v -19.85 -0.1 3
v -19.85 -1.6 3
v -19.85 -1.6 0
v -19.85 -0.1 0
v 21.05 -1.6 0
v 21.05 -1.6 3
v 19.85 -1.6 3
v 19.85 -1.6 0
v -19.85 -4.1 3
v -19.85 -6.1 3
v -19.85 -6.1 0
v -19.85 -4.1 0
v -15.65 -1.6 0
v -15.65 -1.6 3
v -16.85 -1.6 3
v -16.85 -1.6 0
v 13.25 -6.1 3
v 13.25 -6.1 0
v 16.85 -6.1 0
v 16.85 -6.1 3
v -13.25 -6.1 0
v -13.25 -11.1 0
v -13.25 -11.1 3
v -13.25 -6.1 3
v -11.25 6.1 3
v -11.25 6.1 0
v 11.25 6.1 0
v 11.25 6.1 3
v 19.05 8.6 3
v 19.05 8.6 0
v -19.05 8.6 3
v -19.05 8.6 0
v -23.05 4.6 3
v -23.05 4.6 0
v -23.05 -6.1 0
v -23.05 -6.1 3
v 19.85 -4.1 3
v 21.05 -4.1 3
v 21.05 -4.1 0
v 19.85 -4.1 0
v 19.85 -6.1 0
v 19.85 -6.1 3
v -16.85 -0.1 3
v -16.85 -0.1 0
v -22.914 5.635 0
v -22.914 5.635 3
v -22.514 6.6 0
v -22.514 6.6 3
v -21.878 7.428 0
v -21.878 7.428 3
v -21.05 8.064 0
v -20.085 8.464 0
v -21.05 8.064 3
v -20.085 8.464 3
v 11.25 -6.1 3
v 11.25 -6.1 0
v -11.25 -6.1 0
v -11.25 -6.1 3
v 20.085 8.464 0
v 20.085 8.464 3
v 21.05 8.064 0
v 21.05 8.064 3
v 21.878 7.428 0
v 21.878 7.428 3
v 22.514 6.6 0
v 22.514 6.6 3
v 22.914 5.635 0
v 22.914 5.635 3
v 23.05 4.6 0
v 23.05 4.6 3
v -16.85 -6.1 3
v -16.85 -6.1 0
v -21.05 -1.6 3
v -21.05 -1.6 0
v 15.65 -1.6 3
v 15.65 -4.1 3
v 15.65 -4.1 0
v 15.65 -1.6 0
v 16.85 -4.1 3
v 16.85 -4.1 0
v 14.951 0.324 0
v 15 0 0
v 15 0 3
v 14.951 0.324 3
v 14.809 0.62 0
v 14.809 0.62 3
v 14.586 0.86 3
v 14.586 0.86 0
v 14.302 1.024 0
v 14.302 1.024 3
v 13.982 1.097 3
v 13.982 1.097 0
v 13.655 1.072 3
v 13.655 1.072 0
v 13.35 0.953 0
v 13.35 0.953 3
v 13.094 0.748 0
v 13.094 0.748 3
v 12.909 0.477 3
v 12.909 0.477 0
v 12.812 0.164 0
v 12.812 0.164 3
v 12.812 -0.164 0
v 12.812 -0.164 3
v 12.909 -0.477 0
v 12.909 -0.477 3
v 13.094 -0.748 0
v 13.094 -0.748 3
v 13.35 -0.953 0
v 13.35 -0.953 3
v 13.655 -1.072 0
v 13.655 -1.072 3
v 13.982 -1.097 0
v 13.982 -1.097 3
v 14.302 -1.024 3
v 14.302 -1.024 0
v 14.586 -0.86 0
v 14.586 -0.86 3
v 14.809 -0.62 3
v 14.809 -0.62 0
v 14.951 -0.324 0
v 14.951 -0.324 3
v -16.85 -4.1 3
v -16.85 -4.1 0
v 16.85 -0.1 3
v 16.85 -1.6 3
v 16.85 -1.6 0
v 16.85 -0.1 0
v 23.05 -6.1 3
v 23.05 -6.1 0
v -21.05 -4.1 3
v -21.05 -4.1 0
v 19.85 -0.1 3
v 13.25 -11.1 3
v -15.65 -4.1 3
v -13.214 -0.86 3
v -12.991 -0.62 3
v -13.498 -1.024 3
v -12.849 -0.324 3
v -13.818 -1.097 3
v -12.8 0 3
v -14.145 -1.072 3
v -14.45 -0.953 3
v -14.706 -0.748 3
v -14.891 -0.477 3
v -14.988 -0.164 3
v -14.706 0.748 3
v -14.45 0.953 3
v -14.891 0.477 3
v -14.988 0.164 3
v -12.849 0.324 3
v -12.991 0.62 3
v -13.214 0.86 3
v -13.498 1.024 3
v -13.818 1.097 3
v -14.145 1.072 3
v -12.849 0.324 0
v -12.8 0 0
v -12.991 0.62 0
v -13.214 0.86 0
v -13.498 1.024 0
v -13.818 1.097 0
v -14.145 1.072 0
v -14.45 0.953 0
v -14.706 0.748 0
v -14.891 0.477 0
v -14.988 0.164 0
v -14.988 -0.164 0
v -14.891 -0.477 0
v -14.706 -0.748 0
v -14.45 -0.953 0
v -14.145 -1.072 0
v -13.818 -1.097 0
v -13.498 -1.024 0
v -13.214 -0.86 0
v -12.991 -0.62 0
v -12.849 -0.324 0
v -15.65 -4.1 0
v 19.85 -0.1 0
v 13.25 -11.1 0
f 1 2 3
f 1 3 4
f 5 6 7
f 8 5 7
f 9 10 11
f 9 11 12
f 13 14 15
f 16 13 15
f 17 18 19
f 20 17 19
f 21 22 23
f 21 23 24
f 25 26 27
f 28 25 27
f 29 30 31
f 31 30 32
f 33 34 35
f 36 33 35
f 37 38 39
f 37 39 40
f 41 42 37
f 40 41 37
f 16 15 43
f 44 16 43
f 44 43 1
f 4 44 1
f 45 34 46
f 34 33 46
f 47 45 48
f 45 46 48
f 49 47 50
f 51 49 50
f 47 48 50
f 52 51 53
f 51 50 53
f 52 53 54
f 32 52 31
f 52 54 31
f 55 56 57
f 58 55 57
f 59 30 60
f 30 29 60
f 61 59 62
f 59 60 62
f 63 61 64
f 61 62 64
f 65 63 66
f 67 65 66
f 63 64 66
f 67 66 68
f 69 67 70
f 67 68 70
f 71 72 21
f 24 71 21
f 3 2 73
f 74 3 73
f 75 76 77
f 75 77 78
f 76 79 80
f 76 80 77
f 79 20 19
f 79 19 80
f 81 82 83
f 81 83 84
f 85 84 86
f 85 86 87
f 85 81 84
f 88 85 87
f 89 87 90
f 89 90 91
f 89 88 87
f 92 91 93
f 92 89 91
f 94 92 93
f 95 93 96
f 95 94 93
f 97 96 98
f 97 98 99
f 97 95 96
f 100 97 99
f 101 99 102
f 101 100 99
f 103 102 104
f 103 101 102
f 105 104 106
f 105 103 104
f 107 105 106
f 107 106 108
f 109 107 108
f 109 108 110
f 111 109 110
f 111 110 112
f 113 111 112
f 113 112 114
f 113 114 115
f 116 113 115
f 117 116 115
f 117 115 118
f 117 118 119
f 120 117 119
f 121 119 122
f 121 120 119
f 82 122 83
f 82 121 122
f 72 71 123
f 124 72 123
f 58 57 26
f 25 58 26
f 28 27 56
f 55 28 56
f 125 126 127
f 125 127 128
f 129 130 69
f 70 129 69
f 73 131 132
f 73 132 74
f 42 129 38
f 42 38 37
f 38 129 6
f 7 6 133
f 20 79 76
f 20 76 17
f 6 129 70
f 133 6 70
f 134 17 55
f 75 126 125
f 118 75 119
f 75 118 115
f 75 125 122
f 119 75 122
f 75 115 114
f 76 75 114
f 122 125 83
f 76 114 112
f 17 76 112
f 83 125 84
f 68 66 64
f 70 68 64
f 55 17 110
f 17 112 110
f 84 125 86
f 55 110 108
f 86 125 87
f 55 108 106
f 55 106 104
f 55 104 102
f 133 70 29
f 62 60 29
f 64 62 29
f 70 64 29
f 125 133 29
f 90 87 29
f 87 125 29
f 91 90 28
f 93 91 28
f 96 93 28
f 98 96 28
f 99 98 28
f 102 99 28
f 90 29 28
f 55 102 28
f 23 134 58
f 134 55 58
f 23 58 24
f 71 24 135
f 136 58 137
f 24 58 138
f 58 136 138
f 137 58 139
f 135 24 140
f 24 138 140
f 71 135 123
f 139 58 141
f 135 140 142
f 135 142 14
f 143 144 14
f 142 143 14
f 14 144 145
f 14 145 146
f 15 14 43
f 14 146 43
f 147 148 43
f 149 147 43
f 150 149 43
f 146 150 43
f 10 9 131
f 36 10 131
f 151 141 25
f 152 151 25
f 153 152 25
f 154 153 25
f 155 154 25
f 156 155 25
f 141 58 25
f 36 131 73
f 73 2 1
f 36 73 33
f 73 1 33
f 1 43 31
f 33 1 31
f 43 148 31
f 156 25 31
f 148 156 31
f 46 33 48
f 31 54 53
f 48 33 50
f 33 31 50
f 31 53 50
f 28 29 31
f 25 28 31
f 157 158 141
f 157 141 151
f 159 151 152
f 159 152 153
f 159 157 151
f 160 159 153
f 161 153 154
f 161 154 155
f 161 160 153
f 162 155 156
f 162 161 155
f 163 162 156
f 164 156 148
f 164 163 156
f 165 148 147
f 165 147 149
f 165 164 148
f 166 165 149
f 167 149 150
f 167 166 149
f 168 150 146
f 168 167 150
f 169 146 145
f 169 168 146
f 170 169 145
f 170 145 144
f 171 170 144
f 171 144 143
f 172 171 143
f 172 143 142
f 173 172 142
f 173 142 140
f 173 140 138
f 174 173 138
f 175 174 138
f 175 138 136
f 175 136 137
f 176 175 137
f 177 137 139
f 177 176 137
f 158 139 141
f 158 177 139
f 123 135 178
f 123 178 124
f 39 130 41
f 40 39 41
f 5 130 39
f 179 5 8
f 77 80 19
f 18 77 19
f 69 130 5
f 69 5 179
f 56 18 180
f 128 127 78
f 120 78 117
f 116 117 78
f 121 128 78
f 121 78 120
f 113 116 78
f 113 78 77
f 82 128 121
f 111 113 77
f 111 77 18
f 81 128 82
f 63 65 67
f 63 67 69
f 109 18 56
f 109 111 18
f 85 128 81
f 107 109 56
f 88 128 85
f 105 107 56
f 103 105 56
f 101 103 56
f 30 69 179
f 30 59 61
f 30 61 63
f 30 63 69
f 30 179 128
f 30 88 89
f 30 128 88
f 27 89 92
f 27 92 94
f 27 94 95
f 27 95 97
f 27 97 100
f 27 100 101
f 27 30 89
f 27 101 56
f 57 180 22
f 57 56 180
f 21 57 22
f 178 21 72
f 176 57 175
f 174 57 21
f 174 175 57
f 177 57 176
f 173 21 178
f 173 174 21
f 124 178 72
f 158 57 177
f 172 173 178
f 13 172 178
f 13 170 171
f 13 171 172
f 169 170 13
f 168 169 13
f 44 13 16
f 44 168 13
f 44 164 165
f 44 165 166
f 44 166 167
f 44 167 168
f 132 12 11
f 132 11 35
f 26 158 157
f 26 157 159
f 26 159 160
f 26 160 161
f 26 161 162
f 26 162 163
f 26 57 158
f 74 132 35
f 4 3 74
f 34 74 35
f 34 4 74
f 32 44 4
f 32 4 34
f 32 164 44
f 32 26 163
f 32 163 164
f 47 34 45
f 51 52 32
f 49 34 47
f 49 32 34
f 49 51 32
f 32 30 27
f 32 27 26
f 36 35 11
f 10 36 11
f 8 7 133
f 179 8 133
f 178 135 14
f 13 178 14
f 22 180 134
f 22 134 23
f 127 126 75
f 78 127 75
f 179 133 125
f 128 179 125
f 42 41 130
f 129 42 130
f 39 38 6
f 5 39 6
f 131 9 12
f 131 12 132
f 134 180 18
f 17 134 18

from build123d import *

# Parameters (mm, degrees)
SKETCH1_R               = 1.1
BOSS_EXTRUDE1_DEPTH     = 3
FILLET1_R               = 4
CUT_EXTRUDE1_DEPTH      = 10
CUT_EXTRUDE1_DEPTH_BACK = 25.78431964
SKETCH3_W               = 26.5
SKETCH3_H               = 5
BOSS_EXTRUDE2_DEPTH     = 3


with BuildPart() as part:
    # Sketch1 → Boss-Extrude1 (new body)
    with BuildSketch(Plane.XY):
        Polygon((-23.05, 8.6), (-23.05, -6.1), (-11.25, -6.1), (-11.25, 6.1), (11.25, 6.1), (11.25, -6.1), (23.05, -6.1), (23.05, 8.6), align=None)
        with Locations((-13.9, 0)):
            Circle(SKETCH1_R, mode=Mode.SUBTRACT)
        with Locations((13.9, 0)):
            Circle(SKETCH1_R, mode=Mode.SUBTRACT)
    extrude(amount=BOSS_EXTRUDE1_DEPTH)

    # Fillet1
    fillet1_edges = [part.edges().sort_by_distance(p)[0] for p in [
        (-23.05, 8.6, 1.5),
        (23.05, 8.6, 1.5),
    ]]
    fillet(fillet1_edges, radius=FILLET1_R)

    # Sketch2 → Cut-Extrude1 (cut, two sides: drawn at the far end of the back side and taken through both)
    with BuildSketch(Plane(origin=(0, 0, 0), x_dir=(-1, 0, 0), z_dir=(0, 0, -1)).offset(-CUT_EXTRUDE1_DEPTH_BACK)):
        Polygon((-16.85, -0.1), (-19.85, -0.1), (-19.85, -1.6), (-21.05, -1.6), (-21.05, -4.1), (-19.85, -4.1), (-19.85, -6.1), (-16.85, -6.1), (-16.85, -4.1), (-15.65, -4.1), (-15.65, -1.6), (-16.85, -1.6), align=None)
        Polygon((19.85, -4.1), (21.05, -4.1), (21.05, -1.6), (19.85, -1.6), (19.85, -0.1), (16.85, -0.1), (16.85, -1.6), (15.65, -1.6), (15.65, -4.1), (16.85, -4.1), (16.85, -6.1), (19.85, -6.1), align=None)
    extrude(amount=CUT_EXTRUDE1_DEPTH + CUT_EXTRUDE1_DEPTH_BACK, mode=Mode.SUBTRACT)

    # Sketch3 → Boss-Extrude2 (add)
    with BuildSketch(Plane(origin=(0, 0, 0), x_dir=(-1, 0, 0), z_dir=(0, 0, -1))):
        with Locations((0, -8.6)):
            Rectangle(SKETCH3_W, SKETCH3_H)
    extrude(amount=-BOSS_EXTRUDE2_DEPTH)


solid = part.part
